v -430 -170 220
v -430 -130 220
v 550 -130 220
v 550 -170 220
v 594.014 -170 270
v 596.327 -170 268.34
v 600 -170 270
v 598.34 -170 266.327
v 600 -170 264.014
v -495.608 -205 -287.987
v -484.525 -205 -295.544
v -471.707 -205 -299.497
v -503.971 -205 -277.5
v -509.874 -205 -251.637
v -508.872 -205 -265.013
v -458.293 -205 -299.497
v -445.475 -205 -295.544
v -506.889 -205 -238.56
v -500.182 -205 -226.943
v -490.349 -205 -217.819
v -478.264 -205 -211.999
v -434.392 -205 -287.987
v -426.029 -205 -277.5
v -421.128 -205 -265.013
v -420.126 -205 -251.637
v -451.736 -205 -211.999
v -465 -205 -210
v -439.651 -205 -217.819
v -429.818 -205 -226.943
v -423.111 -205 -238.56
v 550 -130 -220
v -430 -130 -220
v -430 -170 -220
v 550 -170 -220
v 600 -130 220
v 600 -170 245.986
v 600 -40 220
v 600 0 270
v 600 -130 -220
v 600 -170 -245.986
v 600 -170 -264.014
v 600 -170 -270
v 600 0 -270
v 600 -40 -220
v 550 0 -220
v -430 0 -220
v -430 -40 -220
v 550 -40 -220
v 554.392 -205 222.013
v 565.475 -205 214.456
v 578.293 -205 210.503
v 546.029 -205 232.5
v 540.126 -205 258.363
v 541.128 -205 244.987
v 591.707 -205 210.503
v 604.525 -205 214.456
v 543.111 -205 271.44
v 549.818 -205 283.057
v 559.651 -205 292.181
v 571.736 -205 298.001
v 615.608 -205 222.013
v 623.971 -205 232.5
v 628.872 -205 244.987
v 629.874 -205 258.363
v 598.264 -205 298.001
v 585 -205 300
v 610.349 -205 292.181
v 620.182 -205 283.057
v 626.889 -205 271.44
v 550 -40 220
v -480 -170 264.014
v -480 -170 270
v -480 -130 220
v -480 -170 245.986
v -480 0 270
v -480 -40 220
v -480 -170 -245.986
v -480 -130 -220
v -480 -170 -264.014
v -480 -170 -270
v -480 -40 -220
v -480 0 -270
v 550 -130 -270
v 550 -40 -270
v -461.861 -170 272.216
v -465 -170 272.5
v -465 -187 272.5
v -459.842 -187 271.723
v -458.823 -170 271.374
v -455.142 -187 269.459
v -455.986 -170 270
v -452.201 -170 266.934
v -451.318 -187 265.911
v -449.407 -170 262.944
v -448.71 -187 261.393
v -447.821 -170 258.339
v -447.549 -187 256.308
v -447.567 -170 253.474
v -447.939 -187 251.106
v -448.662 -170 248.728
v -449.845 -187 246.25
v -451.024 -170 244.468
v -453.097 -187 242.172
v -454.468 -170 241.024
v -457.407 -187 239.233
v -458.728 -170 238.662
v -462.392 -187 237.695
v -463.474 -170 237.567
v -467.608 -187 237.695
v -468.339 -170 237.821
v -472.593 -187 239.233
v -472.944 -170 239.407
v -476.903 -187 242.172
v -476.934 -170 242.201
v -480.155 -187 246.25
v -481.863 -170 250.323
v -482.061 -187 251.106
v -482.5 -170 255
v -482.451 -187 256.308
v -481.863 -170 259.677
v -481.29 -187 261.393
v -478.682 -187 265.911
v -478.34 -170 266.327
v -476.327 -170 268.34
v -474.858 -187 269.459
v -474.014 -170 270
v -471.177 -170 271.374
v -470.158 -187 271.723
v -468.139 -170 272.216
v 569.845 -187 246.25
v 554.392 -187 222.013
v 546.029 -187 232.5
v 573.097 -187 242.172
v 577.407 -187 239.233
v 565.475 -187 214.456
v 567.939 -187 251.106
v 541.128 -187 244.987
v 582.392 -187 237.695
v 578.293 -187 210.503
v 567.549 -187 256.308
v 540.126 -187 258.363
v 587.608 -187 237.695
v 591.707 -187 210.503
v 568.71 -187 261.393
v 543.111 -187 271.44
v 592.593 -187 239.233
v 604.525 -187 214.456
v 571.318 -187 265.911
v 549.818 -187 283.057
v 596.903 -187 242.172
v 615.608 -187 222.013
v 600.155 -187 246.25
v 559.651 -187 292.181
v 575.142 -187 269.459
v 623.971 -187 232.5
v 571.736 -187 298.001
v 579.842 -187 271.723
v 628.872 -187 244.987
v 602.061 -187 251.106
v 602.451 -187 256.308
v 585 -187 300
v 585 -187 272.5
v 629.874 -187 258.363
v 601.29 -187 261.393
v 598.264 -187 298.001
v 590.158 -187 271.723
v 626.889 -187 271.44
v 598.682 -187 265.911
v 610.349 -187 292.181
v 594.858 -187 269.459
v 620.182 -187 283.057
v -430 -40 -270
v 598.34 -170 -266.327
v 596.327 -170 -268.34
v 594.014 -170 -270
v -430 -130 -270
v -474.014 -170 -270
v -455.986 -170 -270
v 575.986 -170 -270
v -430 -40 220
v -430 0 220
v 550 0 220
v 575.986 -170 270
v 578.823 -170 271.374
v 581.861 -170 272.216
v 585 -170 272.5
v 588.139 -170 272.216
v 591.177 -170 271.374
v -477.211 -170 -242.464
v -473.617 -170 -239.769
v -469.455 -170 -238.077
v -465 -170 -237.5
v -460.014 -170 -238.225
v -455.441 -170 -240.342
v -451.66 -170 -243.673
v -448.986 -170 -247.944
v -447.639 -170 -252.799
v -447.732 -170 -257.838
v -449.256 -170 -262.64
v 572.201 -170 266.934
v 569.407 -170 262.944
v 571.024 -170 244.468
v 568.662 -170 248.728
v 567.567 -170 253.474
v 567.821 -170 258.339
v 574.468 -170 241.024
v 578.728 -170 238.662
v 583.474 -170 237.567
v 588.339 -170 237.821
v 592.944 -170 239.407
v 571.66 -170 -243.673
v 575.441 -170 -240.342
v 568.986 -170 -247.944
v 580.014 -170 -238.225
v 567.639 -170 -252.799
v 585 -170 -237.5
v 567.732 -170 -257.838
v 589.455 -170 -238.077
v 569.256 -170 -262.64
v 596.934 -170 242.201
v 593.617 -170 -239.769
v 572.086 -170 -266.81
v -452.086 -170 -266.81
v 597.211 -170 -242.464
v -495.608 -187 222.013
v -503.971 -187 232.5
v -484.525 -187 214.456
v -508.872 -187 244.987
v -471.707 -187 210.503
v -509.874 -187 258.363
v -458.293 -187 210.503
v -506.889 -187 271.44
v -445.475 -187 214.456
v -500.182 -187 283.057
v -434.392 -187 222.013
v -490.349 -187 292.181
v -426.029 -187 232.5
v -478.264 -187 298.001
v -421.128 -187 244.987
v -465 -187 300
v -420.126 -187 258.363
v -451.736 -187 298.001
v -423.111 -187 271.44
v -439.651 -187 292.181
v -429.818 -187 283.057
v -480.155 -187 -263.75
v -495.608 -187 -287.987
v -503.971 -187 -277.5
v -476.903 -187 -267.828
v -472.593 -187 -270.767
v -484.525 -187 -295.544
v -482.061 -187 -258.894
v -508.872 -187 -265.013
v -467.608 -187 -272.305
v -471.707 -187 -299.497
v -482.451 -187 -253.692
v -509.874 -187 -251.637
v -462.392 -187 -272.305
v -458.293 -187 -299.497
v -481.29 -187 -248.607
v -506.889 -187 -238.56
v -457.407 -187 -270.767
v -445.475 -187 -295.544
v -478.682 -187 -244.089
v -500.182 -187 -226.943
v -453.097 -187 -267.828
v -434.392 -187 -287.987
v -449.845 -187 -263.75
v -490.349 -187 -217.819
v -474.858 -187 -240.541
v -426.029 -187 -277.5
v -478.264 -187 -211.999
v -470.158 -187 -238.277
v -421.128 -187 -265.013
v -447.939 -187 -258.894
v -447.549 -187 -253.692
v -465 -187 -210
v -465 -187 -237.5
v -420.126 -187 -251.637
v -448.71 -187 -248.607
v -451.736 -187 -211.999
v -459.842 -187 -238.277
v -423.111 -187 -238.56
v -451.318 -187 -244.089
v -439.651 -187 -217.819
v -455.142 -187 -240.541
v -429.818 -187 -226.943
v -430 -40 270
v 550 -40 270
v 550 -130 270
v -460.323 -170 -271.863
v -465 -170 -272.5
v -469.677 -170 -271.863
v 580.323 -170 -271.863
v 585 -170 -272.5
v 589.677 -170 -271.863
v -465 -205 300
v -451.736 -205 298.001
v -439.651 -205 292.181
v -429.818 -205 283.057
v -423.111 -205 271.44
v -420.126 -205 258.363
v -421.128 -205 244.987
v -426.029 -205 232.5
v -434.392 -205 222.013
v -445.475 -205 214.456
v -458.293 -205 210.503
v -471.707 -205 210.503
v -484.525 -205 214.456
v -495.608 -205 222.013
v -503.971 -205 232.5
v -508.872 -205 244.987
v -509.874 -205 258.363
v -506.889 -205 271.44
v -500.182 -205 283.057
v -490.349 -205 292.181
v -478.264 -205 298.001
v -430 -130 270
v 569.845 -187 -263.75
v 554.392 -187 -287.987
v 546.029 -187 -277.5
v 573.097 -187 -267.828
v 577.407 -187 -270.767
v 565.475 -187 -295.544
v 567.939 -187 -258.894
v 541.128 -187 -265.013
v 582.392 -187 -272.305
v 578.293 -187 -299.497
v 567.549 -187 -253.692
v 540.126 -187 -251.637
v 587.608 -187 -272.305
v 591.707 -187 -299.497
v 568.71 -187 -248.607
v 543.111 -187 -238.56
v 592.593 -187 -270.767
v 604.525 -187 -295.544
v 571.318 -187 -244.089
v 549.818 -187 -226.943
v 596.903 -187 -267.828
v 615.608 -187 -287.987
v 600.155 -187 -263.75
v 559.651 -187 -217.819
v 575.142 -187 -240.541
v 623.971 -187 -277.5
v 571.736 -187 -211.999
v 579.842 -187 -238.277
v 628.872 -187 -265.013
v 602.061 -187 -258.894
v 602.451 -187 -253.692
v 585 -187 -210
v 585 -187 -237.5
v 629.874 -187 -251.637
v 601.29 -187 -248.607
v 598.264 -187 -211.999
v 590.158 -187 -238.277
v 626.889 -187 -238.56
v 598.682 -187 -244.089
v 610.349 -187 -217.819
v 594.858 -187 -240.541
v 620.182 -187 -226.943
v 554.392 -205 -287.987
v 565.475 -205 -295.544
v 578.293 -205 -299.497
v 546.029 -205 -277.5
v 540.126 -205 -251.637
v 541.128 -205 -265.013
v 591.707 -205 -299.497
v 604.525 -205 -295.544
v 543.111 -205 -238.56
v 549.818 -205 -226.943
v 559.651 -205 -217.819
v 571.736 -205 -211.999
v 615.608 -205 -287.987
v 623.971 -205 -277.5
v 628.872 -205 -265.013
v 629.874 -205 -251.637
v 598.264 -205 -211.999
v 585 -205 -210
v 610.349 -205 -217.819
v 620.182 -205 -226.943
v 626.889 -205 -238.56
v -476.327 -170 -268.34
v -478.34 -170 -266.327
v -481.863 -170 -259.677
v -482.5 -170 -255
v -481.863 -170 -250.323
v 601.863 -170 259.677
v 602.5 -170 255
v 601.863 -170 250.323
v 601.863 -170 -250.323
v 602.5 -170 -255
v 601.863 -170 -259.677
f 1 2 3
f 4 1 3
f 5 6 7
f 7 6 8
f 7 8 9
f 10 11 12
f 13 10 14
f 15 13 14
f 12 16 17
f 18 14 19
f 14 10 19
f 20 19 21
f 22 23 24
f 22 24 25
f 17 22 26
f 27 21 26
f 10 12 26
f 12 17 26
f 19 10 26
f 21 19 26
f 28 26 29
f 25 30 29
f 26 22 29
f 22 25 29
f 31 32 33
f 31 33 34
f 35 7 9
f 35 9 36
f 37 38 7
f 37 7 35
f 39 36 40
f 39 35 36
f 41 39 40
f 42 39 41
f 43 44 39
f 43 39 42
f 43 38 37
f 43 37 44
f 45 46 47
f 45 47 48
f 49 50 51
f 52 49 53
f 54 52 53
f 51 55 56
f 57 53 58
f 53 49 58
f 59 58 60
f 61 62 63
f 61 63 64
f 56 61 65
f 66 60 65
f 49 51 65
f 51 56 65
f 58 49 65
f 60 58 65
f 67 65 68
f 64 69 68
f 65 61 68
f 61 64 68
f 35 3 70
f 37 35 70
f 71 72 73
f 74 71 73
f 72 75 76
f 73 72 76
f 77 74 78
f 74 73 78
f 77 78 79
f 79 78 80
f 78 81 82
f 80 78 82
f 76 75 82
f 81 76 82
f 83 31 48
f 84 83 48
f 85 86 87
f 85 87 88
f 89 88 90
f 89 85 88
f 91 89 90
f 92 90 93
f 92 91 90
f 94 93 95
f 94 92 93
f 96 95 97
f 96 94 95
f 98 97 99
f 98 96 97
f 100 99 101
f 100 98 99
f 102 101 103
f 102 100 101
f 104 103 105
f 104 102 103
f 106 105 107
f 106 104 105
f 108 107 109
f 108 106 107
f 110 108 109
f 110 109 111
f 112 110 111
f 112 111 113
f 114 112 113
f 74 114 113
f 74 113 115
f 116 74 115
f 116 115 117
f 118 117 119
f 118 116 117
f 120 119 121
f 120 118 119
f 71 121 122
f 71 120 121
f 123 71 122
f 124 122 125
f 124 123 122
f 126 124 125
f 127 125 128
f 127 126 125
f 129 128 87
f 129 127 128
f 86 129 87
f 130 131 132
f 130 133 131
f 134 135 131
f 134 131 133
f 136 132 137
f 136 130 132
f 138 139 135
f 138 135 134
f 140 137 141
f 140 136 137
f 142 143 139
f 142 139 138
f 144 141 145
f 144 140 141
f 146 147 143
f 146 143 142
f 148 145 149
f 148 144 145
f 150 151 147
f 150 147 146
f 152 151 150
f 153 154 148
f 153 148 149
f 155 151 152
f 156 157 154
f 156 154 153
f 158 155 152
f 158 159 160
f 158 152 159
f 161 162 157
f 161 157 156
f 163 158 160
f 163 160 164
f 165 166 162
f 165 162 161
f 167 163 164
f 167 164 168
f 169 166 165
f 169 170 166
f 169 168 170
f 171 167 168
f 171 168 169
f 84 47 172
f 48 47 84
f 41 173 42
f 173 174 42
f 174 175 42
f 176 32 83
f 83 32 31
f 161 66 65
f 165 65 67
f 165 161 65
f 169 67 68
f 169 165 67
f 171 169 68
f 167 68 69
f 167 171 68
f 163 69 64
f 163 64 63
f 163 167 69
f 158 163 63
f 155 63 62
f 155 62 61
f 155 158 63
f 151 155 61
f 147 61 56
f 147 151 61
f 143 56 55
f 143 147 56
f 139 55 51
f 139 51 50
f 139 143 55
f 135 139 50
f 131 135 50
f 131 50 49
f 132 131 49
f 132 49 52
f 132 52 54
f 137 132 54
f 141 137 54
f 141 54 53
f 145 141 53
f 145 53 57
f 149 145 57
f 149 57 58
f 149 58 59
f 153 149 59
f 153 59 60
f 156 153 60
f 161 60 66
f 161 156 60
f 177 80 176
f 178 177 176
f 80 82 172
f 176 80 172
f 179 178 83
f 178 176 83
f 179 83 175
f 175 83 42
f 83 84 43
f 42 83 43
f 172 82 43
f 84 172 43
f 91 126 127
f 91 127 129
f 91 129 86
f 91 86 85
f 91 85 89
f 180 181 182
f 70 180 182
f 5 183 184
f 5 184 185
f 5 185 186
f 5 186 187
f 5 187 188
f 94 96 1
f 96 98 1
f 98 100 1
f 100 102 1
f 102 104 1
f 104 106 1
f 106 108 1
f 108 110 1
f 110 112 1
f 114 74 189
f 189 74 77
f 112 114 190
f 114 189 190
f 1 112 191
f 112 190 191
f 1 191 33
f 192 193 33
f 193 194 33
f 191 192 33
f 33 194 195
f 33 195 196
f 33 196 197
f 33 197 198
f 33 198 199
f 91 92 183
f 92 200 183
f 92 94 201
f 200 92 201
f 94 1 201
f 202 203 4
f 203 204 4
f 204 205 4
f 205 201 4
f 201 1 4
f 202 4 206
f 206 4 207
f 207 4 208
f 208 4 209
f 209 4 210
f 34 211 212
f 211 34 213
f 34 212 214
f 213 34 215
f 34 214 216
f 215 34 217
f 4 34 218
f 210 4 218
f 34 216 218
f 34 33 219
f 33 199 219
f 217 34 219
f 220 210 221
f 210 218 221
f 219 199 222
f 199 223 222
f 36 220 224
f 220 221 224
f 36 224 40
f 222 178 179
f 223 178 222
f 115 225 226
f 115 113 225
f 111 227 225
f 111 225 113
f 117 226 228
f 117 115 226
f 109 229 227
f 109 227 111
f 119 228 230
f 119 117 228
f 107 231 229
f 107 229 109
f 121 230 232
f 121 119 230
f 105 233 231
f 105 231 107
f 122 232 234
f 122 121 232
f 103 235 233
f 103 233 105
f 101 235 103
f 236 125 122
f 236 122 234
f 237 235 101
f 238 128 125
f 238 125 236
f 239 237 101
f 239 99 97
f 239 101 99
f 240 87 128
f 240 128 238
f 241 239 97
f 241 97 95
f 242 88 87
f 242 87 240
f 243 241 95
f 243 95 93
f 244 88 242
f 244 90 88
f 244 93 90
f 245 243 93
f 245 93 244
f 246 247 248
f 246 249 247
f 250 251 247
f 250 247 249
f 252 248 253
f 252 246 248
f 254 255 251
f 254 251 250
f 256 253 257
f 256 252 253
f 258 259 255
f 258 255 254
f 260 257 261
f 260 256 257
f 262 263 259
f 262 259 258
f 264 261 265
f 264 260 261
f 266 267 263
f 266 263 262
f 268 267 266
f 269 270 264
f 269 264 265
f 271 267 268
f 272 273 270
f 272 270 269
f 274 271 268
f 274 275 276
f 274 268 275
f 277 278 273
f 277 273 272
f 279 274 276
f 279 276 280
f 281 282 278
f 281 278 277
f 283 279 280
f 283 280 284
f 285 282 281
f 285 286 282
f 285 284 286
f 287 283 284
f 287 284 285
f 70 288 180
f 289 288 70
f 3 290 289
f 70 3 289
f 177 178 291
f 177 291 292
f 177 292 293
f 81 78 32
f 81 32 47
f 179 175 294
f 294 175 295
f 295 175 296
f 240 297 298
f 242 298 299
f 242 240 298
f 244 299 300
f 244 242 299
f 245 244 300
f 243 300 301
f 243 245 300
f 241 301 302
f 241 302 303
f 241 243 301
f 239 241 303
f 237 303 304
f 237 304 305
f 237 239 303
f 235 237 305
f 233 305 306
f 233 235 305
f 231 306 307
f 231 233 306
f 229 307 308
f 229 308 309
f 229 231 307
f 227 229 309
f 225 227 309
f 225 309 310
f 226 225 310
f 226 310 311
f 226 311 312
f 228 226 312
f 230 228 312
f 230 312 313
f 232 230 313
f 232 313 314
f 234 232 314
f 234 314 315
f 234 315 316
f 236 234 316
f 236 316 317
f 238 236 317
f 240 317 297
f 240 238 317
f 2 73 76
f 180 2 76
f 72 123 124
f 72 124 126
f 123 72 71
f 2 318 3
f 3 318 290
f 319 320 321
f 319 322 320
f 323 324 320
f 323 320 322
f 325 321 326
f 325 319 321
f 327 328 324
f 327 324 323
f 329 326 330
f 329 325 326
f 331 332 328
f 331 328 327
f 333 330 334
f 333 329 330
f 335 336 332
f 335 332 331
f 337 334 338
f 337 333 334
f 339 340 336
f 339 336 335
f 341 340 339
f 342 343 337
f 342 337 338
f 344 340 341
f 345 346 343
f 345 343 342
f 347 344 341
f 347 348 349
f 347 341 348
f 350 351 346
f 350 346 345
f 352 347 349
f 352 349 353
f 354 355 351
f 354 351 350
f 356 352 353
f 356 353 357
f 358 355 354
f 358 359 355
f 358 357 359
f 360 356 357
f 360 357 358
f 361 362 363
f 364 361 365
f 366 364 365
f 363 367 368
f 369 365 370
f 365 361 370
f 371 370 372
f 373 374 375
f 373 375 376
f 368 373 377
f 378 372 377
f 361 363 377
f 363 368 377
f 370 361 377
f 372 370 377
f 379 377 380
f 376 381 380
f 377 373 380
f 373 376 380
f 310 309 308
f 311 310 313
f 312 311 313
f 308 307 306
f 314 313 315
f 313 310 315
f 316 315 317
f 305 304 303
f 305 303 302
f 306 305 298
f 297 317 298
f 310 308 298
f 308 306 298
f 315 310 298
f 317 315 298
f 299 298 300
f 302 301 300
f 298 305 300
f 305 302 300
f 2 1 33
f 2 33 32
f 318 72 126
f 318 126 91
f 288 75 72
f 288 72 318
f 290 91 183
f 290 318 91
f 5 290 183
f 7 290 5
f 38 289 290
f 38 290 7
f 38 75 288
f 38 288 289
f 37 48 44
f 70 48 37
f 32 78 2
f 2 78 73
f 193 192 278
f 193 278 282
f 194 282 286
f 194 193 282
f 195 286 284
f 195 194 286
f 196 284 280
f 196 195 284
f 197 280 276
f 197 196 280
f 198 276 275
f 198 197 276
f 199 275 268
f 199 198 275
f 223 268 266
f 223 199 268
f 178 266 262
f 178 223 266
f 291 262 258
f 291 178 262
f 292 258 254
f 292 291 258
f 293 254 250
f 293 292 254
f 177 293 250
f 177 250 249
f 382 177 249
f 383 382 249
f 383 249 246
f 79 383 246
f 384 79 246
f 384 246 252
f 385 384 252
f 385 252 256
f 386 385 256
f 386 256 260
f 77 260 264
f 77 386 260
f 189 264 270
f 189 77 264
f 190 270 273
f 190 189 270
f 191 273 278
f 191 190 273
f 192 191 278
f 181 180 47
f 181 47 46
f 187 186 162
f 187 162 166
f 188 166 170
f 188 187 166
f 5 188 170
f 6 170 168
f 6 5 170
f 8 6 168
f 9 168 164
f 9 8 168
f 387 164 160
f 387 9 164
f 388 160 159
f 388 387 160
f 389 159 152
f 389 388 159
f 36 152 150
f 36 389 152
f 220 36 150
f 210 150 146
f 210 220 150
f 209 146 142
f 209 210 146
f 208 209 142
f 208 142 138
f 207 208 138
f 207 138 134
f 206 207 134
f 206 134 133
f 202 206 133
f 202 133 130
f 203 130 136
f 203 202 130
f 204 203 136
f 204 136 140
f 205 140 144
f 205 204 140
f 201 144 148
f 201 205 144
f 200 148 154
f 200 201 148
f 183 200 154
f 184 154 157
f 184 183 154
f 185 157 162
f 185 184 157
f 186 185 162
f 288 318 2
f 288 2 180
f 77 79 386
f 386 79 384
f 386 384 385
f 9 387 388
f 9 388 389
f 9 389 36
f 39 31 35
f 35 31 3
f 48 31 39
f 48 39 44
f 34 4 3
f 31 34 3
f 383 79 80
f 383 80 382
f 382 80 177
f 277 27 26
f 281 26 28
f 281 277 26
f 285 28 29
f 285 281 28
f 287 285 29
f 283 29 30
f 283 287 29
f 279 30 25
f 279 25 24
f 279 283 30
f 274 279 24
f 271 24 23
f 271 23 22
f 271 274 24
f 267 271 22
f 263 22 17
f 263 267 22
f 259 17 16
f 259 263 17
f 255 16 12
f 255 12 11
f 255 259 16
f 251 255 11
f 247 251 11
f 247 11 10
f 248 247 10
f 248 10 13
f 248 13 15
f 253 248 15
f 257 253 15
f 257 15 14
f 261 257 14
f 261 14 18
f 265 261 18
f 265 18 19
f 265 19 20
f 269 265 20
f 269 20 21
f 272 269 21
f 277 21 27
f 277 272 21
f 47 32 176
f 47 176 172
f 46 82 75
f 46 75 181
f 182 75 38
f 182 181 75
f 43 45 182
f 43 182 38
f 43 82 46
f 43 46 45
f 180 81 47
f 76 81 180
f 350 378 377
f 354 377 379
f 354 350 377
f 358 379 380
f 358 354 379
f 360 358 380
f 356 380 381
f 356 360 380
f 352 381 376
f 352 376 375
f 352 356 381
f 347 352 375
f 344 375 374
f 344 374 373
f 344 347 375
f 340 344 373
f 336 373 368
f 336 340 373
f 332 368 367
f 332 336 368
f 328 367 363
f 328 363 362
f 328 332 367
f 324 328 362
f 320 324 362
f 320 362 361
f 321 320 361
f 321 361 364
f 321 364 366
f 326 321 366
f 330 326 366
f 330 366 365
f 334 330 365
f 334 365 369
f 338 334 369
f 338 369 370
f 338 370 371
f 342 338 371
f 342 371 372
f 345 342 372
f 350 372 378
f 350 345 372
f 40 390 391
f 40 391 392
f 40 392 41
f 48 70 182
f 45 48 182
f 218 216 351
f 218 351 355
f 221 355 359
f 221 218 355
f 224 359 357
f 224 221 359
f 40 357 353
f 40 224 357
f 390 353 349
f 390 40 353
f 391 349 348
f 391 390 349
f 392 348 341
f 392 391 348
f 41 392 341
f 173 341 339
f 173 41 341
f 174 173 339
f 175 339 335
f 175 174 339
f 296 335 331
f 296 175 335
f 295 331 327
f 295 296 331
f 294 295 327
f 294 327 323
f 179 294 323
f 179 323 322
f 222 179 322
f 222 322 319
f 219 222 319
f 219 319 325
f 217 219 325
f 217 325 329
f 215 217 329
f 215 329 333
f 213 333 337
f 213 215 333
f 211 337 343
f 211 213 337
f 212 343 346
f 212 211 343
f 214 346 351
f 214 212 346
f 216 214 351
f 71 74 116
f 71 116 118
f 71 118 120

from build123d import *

# Parameters (mm, degrees)
SKETCH_1_W             = 1080
SKETCH_1_H             = 540
SKETCH_1_W_2           = 980
SKETCH_1_H_2           = 440
EXTRUDE_1_DEPTH        = 170
SKETCH_2_W             = 980
SKETCH_2_H             = 90
CUT_EXTRUDE_1_DEPTH    = 825.924238946
SKETCH_3_W             = 440
SKETCH_3_H             = 90
CUT_EXTRUDE_2_DEPTH    = 1127.143862923
FOUR_START             = -187
SKETCH_6_R             = 45
FOUR_BASE_PADS_DEPTH   = 18
FOUR_BASE_PADS_2_DEPTH = 18
FOUR_BASE_PADS_3_DEPTH = 18
FOUR_BASE_PADS_4_DEPTH = 18
FOUR_START_2           = -170
SKETCH_7_R             = 17.5
FOUR_FOOT_STEMS_DEPTH  = 17


with BuildPart() as part:
    # 草图1 → 拉伸-薄壁1 (new body)
    with BuildSketch(Plane(origin=(0, 0, 0), x_dir=(1, 0, 0), z_dir=(0, 1, 0))):
        with Locations((60, 0)):
            Rectangle(SKETCH_1_W, SKETCH_1_H)
        with Locations((60, 0)):
            Rectangle(SKETCH_1_W_2, SKETCH_1_H_2, mode=Mode.SUBTRACT)
    extrude(amount=-EXTRUDE_1_DEPTH)

    # 草图2 → 切除-拉伸1 (cut, through all)
    with BuildSketch(Plane.XY.offset(270)):
        with Locations((60, -85)):
            Rectangle(SKETCH_2_W, SKETCH_2_H)
    extrude(amount=-CUT_EXTRUDE_1_DEPTH, mode=Mode.SUBTRACT)

    # 草图3 → 切除-拉伸2 (cut, through all)
    with BuildSketch(Plane.ZY.offset(480)):
        with Locations((0, -85)):
            Rectangle(SKETCH_3_W, SKETCH_3_H)
    extrude(amount=-CUT_EXTRUDE_2_DEPTH, mode=Mode.SUBTRACT)



with BuildPart() as body_2:
    # 草图6 → Four Base Pads (new body)
    with BuildSketch(Plane(origin=(0, 0, 0), x_dir=(1, 0, 0), z_dir=(0, 1, 0)).offset(FOUR_START)):
        with Locations(Location((-465, -255, 0), (0, 0, 270))):
            Circle(SKETCH_6_R)
    extrude(amount=-FOUR_BASE_PADS_DEPTH)


with BuildPart() as body_3:
    # 草图6 → Four Base Pads 2 (new body)
    with BuildSketch(Plane(origin=(0, 0, 0), x_dir=(1, 0, 0), z_dir=(0, 1, 0)).offset(FOUR_START)):
        with Locations(Location((-465, 255, 0), (0, 0, 270))):
            Circle(SKETCH_6_R)
    extrude(amount=-FOUR_BASE_PADS_2_DEPTH)


with BuildPart() as body_4:
    # 草图6 → Four Base Pads 3 (new body)
    with BuildSketch(Plane(origin=(0, 0, 0), x_dir=(1, 0, 0), z_dir=(0, 1, 0)).offset(FOUR_START)):
        with Locations(Location((585, -255, 0), (0, 0, 270))):
            Circle(SKETCH_6_R)
    extrude(amount=-FOUR_BASE_PADS_3_DEPTH)


with BuildPart() as body_5:
    # 草图6 → Four Base Pads 4 (new body)
    with BuildSketch(Plane(origin=(0, 0, 0), x_dir=(1, 0, 0), z_dir=(0, 1, 0)).offset(FOUR_START)):
        with Locations(Location((585, 255, 0), (0, 0, 270))):
            Circle(SKETCH_6_R)
    extrude(amount=-FOUR_BASE_PADS_4_DEPTH)


with BuildPart() as part_1:
    add(part.part)

    add(body_2.part)  # Four Foot Stems merges body 2

    add(body_3.part)  # Four Foot Stems merges body 3

    add(body_4.part)  # Four Foot Stems merges body 4

    add(body_5.part)  # Four Foot Stems merges body 5
    # 草图7 → Four Foot Stems (add)
    with BuildSketch(Plane(origin=(0, 0, 0), x_dir=(1, 0, 0), z_dir=(0, 1, 0)).offset(FOUR_START_2)):
        with Locations(Location((-465, -255, 0), (0, 0, 270))):
            Circle(SKETCH_7_R)
        with Locations(Location((-465, 255, 0), (0, 0, 270))):
            Circle(SKETCH_7_R)
        with Locations(Location((585, -255, 0), (0, 0, 270))):
            Circle(SKETCH_7_R)
        with Locations(Location((585, 255, 0), (0, 0, 270))):
            Circle(SKETCH_7_R)
    extrude(amount=-FOUR_FOOT_STEMS_DEPTH)


solid = part_1.part
